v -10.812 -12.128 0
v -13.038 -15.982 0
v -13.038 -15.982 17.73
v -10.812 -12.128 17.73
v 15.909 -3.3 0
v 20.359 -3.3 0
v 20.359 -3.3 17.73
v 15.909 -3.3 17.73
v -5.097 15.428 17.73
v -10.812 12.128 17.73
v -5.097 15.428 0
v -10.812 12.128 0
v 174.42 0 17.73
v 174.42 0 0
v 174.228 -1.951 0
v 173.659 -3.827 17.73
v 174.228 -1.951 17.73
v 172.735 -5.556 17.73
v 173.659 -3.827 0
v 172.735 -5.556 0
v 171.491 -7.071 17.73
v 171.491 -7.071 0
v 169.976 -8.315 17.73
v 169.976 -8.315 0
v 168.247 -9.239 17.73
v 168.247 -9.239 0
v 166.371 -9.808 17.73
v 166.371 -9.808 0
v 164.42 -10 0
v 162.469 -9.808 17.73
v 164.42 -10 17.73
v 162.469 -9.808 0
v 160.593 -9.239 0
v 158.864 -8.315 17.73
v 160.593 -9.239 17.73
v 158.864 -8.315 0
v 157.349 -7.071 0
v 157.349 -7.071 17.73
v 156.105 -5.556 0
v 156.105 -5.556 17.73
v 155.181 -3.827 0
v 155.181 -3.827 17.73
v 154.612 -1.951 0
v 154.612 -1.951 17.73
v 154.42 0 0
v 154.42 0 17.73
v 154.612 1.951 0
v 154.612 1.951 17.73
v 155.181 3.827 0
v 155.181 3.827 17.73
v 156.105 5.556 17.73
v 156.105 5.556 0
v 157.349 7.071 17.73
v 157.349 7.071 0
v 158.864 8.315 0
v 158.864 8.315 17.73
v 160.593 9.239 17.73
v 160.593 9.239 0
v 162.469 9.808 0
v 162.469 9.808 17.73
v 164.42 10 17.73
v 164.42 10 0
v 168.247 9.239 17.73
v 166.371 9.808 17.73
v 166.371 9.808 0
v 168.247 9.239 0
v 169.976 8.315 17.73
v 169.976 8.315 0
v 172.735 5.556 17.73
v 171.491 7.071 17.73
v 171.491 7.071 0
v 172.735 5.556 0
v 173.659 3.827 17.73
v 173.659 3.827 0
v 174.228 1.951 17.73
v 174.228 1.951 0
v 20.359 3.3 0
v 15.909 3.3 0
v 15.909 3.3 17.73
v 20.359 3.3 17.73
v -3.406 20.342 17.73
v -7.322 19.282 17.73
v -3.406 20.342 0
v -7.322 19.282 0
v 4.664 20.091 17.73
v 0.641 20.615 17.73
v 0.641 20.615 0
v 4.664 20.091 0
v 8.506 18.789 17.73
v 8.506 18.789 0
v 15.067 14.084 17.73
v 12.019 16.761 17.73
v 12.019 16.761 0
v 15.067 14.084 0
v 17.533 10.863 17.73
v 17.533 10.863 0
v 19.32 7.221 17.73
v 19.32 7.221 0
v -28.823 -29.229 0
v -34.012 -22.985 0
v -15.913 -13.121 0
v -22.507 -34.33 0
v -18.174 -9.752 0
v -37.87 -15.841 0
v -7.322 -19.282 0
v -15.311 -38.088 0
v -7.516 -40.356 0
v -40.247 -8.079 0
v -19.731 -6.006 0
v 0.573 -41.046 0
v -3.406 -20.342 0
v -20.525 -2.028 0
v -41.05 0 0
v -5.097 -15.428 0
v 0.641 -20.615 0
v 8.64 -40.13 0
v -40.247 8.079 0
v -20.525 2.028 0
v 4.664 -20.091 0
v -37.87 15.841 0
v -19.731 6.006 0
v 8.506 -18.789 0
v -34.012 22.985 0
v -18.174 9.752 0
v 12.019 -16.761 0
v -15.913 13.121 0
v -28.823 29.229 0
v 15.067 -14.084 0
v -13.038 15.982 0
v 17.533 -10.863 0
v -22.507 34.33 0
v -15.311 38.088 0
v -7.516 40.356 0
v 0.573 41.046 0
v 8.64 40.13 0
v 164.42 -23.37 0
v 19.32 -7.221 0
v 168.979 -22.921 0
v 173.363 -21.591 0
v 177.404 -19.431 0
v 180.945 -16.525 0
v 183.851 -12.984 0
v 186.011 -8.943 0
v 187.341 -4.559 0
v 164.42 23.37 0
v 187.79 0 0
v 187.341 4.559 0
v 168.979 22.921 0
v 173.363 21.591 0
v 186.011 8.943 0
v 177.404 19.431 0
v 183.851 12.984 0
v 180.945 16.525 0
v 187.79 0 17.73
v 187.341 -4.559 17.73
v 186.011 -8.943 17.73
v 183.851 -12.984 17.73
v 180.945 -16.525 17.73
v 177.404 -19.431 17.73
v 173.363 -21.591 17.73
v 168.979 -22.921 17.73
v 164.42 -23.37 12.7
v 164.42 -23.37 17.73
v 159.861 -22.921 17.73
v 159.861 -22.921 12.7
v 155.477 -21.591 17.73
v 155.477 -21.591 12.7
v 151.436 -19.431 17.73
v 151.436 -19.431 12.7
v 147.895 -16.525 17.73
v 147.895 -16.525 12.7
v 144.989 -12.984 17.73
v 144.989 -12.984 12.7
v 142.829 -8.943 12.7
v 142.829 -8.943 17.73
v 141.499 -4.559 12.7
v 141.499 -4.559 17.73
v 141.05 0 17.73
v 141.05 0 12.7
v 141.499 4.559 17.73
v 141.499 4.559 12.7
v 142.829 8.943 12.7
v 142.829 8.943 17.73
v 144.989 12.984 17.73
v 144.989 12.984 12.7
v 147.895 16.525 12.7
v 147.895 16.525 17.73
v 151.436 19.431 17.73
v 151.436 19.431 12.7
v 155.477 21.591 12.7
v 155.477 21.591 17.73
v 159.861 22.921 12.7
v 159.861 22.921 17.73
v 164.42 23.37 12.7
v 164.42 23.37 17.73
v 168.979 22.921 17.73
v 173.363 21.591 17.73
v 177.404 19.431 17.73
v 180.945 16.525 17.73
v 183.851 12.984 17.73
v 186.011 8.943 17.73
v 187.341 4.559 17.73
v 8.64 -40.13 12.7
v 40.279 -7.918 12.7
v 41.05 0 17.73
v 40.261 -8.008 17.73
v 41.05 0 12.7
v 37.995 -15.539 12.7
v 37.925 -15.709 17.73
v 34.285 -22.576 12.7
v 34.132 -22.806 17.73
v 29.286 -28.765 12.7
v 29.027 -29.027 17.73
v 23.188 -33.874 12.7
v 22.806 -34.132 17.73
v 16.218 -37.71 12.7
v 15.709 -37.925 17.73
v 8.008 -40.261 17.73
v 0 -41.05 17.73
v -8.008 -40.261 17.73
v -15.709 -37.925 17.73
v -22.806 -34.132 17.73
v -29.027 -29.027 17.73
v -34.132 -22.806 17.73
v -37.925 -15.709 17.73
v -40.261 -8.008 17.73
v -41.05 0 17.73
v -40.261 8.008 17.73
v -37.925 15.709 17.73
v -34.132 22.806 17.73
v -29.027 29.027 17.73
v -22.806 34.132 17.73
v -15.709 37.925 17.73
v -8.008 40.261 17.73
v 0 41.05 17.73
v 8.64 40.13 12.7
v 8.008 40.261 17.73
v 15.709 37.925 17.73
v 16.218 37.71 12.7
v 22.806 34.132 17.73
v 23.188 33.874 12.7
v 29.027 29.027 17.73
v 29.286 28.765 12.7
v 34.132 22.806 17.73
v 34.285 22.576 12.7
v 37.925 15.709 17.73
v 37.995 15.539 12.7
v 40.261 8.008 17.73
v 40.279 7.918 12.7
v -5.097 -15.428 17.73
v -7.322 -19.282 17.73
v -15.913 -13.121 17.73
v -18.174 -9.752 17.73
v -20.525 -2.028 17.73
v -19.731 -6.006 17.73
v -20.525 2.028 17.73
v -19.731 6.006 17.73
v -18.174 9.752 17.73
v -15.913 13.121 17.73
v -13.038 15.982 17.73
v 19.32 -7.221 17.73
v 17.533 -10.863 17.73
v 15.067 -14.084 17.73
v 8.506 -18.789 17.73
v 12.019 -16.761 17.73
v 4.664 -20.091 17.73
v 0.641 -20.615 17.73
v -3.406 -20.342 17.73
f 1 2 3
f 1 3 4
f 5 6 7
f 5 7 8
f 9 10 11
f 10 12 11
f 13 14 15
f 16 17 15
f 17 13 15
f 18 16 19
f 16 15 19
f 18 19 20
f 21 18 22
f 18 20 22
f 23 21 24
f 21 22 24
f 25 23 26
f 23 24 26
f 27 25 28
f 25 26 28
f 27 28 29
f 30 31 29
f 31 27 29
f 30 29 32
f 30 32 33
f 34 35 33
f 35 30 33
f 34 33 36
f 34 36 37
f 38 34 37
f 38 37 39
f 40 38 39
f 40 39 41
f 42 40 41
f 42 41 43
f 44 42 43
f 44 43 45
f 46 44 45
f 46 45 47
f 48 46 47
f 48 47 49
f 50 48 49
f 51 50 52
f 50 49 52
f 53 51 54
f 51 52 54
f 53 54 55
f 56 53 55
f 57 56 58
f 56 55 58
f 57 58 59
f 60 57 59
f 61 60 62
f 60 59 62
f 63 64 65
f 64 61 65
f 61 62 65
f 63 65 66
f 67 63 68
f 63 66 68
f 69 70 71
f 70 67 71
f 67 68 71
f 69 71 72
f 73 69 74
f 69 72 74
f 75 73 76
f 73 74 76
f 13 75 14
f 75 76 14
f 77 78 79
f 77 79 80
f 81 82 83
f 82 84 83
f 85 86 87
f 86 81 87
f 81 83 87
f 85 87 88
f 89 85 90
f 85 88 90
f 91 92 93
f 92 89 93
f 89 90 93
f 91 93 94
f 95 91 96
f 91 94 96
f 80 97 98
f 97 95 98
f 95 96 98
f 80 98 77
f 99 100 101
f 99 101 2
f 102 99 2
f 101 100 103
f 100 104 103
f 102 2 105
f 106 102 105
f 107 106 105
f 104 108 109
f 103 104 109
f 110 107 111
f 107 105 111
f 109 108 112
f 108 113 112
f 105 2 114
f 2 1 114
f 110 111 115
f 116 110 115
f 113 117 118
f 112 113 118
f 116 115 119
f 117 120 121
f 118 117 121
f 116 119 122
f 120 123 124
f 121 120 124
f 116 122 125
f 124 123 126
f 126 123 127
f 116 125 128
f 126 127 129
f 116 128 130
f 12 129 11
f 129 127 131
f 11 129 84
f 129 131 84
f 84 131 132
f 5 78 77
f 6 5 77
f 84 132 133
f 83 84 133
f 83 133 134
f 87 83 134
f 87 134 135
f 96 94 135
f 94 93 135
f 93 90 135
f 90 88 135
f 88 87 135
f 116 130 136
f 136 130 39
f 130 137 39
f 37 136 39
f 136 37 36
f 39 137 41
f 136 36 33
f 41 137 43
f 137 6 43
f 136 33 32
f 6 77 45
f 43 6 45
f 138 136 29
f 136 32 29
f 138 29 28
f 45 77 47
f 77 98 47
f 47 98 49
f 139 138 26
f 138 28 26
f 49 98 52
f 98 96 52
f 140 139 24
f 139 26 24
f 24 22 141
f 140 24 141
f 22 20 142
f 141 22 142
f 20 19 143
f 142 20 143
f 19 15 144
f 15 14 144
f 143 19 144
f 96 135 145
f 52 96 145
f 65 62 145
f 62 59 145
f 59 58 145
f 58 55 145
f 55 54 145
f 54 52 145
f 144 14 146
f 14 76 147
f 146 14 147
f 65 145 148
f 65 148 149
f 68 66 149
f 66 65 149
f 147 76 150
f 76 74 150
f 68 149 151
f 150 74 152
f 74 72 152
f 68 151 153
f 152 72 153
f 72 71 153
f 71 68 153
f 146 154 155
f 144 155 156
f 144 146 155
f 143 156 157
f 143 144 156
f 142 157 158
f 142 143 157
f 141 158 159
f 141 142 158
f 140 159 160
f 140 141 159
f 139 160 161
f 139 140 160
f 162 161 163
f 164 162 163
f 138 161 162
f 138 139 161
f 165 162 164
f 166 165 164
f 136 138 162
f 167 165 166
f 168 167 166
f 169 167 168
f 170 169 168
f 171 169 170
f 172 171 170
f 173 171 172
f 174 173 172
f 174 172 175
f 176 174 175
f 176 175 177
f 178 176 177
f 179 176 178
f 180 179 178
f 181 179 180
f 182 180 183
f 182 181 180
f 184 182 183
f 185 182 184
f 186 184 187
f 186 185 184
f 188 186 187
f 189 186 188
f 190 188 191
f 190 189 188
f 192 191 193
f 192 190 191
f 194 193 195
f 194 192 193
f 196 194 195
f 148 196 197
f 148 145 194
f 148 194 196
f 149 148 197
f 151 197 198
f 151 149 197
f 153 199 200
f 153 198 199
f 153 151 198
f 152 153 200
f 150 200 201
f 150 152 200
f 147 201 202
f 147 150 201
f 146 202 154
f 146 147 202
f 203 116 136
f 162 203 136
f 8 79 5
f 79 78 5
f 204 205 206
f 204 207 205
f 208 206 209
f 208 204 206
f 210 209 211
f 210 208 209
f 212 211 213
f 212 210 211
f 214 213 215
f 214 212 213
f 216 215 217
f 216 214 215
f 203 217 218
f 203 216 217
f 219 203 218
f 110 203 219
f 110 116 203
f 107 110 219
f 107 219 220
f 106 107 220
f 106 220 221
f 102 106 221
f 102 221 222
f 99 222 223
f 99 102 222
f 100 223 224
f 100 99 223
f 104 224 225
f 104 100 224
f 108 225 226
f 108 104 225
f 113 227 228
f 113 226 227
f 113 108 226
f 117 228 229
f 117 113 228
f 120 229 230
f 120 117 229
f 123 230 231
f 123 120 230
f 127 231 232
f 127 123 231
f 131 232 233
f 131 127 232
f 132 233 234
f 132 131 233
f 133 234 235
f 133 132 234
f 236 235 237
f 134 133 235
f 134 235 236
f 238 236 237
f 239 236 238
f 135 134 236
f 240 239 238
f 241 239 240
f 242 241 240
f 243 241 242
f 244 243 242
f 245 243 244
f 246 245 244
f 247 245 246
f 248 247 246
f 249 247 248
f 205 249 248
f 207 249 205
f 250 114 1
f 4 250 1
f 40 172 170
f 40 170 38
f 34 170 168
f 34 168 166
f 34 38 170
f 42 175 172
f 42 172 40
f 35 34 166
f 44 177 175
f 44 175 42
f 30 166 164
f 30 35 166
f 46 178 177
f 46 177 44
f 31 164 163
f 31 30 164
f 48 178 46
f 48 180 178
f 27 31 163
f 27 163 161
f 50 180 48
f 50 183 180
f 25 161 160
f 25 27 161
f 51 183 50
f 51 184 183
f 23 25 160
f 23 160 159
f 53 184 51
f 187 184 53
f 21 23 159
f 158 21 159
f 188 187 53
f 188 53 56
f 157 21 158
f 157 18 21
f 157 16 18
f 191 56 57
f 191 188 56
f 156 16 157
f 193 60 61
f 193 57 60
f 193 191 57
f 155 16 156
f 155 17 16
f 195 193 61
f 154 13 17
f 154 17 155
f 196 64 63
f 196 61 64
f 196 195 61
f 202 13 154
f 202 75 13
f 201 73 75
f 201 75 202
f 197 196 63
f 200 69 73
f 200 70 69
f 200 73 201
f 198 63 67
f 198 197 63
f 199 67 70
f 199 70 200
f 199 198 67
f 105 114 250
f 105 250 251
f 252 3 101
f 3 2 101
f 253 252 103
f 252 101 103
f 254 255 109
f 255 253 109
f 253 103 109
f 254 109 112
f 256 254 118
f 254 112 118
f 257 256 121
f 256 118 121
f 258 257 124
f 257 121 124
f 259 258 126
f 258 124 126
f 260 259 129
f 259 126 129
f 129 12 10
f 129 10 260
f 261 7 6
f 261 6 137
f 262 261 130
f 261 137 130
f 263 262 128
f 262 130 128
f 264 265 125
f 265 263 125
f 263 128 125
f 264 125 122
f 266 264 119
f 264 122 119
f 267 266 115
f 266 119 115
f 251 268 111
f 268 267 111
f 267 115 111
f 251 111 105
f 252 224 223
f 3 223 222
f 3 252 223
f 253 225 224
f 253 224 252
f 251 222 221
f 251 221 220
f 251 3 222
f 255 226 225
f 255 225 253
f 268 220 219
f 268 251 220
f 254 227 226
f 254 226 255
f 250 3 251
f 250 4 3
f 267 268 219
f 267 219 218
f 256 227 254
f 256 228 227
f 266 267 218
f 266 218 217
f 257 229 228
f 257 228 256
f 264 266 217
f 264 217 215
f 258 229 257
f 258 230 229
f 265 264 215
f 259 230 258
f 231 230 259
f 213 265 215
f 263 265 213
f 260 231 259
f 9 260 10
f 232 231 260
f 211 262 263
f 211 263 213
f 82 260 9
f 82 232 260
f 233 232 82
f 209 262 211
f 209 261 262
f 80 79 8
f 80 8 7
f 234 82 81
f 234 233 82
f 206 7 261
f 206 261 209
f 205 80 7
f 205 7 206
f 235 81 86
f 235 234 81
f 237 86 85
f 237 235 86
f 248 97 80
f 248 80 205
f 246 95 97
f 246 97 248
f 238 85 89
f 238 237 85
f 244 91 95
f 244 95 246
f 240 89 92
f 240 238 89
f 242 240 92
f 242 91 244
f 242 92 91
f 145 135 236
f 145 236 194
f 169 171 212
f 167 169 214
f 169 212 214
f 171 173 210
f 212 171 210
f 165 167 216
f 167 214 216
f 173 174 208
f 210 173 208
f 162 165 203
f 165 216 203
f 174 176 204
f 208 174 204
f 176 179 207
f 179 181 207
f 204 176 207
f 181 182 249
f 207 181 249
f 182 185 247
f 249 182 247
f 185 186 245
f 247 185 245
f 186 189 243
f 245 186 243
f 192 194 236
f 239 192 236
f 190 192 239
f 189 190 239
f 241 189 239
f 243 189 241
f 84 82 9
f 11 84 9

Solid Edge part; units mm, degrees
sketch "Sketch1" plane through (0, 0, 0) normal (0, 0, 1) x (1, 0, 0)
  circle A0 centre (0, 0) radius 41.05
  circle A1 centre (0, 0) radius 20.625
  circle A2 centre (164.42, 0) radius 23.37
  circle A3 centre (164.42, 0) radius 10
extrude "Protrusion1" add sketch "Sketch1" along normal blind 17.73
sketch "Sketch2" plane through (0, 0, 0) normal (0, 0, 1) x (1, 0, 0)
  line L0 (8.6399, 40.1305) -> (164.42, 23.37)
  line L1 (144.2869, 0) -> (164.42, 23.37)
  line L2 (164.42, -23.37) -> (144.2869, 0)
  line L3 (8.6399, -40.1305) -> (164.42, -23.37)
  line L4 (30.0194, 0) -> (8.6399, -40.1305)
  line L5 (8.6399, 40.1305) -> (30.0194, 0)
extrude "ExtrudedProtrusion_2" add sketch "Sketch2" along normal blind 12.7
sketch "Sketch3" plane through (0, 0, 0) normal (0, 0, 1) x (1, 0, 0)
  line L0 (-10.8125, 12.1278) -> (-5.0968, 15.4278)
  line L1 (-7.5968, 19.758) -> (-5.0968, 15.4278)
  line L2 (-13.3125, 16.458) -> (-7.5968, 19.758)
  line L3 (-10.8125, 12.1278) -> (-13.3125, 16.458)
  line L4 (-5.0968, -15.4278) -> (-7.5968, -19.758)
  line L5 (-7.5968, -19.758) -> (-13.3125, -16.458)
  line L6 (-13.3125, -16.458) -> (-10.8125, -12.1278)
  line L7 (-5.0968, -15.4278) -> (-10.8125, -12.1278)
  line L8 (15.9093, 3.3) -> (15.9093, -3.3)
  line L9 (20.9093, -3.3) -> (15.9093, -3.3)
  line L10 (20.9093, 3.3) -> (20.9093, -3.3)
  line L11 (15.9093, 3.3) -> (20.9093, 3.3)
extrude "Protrusion2" add sketch "Sketch3" along normal up to vertex (17.73 mm away)
